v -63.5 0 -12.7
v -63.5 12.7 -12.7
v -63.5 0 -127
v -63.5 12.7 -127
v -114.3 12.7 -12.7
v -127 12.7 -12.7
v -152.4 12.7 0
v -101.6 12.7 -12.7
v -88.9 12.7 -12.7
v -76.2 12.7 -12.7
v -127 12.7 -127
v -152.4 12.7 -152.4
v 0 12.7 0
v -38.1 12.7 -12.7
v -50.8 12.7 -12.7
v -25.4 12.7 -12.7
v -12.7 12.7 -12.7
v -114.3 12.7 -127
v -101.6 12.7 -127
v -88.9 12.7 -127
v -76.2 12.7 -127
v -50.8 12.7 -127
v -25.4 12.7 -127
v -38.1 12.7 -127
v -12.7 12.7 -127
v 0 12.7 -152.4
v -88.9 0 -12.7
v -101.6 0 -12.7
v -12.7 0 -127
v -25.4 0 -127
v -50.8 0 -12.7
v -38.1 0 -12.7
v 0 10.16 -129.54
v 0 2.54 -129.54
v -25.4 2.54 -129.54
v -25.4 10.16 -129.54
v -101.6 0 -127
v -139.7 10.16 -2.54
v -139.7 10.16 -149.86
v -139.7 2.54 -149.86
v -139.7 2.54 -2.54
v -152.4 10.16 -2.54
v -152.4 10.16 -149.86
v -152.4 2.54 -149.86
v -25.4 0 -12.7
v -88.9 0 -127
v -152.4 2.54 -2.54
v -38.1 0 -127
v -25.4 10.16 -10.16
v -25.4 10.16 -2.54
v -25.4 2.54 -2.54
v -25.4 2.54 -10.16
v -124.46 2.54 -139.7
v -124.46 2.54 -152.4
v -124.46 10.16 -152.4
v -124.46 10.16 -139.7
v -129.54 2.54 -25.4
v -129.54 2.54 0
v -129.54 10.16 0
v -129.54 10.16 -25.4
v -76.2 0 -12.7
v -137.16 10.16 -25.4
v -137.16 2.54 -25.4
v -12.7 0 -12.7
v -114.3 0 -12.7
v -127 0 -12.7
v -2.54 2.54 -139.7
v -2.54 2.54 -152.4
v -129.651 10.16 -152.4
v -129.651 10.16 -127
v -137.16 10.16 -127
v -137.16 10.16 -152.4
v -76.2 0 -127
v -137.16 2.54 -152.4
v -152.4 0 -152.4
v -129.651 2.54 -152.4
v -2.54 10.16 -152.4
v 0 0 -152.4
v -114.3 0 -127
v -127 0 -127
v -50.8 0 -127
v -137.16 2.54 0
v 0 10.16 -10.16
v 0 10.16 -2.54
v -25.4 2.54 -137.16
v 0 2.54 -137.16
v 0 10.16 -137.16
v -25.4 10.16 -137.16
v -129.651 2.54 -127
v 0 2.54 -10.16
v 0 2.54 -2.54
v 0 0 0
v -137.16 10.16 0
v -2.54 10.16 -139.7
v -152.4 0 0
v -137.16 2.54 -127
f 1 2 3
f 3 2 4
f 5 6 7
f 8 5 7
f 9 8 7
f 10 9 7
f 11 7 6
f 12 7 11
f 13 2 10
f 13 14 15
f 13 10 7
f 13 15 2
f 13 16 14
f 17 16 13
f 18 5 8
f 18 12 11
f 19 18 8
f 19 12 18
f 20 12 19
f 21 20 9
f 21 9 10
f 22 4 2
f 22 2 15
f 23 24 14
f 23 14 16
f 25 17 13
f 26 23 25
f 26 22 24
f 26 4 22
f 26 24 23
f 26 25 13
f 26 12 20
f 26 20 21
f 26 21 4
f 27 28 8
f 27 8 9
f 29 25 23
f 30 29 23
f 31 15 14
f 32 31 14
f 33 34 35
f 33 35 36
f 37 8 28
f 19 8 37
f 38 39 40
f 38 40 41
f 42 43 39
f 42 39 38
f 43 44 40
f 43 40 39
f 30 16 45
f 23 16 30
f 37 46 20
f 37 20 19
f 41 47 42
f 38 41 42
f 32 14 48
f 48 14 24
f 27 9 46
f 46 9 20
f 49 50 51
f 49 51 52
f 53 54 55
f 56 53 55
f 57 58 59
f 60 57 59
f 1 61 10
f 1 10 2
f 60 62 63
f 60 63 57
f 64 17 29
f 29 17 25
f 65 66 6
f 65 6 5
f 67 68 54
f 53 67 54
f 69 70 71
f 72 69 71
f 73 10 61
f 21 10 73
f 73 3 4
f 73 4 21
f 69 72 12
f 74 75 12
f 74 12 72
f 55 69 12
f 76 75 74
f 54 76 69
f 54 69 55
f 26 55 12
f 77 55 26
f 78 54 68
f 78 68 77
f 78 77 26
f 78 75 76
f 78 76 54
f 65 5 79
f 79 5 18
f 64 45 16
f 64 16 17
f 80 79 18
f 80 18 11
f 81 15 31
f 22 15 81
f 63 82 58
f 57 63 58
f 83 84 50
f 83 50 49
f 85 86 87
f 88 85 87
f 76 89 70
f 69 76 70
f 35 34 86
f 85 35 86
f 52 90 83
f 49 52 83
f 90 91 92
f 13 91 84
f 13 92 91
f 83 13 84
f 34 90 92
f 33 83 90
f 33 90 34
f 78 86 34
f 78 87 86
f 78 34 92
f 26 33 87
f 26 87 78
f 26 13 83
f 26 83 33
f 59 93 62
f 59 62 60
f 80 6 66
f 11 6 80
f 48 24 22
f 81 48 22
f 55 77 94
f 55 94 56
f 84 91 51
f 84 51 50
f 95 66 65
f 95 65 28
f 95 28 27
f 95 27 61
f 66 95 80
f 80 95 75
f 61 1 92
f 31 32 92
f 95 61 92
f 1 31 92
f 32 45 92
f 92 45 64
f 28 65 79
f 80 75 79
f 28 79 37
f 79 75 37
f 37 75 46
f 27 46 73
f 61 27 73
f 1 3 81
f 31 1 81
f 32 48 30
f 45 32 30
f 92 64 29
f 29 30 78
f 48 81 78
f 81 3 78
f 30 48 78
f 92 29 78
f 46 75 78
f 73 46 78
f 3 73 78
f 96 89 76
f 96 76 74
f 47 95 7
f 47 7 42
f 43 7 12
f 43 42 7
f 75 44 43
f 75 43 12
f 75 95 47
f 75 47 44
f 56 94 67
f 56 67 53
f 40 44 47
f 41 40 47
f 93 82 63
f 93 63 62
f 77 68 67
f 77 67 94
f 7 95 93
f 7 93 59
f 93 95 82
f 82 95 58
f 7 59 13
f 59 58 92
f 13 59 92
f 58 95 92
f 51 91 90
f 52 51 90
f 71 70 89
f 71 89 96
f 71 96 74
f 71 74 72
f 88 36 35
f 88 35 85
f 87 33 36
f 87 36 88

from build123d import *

# Parameters (mm, degrees)
SKETCH3_W           = 152.4
SKETCH3_H           = 152.4
BOSS_EXTRUDE1_DEPTH = 12.7
SKETCH5_W           = 147.32
SKETCH5_H           = 7.62
CUT_EXTRUDE1_DEPTH  = 12.7
SKETCH6_W           = 12.7
SKETCH6_H           = 127
CUT_EXTRUDE3_DEPTH  = 12.7
SKETCH8_W           = 7.62
SKETCH8_H           = 7.62
CUT_EXTRUDE4_DEPTH  = 25.4
SKETCH9_W           = 7.62
SKETCH9_H           = 7.62
CUT_EXTRUDE5_DEPTH  = 25.4
SKETCH10_W          = 7.508888552
SKETCH10_H          = 7.62
CUT_EXTRUDE6_DEPTH  = 25.4
SKETCH11_W          = 7.62
SKETCH11_H          = 7.62
BOSS_EXTRUDE2_DEPTH = 25.4
SKETCH12_W          = 127.135461675
SKETCH12_H          = 12.7
BOSS_EXTRUDE3_DEPTH = 25.4
SKETCH14_W          = 121.92
SKETCH14_H          = 7.62
CUT_EXTRUDE7_DEPTH  = 12.7
SKETCH15_W          = 7.62
SKETCH15_H          = 7.62
CUT_EXTRUDE9_DEPTH  = 25.4


with BuildPart() as part:
    # Sketch3 → Boss-Extrude1 (new body)
    with BuildSketch(Plane(origin=(0, 0, 0), x_dir=(1, 0, 0), z_dir=(0, 1, 0))):
        with Locations((-76.2, 76.2)):
            Rectangle(SKETCH3_W, SKETCH3_H)
    extrude(amount=BOSS_EXTRUDE1_DEPTH)

    # Sketch5 → Cut-Extrude1 (cut)
    with BuildSketch(Plane.ZY.offset(152.4)):
        with Locations((-76.2, 6.35)):
            Rectangle(SKETCH5_W, SKETCH5_H)
    extrude(amount=-CUT_EXTRUDE1_DEPTH, mode=Mode.SUBTRACT)

    # Sketch6 → Cut-Extrude3 (cut)
    with BuildSketch(Plane(origin=(0, 12.7, 0), x_dir=(1, 0, 0), z_dir=(0, 1, 0))):
        with Locations((-120.65, 76.2)):
            Rectangle(SKETCH6_W, SKETCH6_H)
        with Locations((-95.25, 76.2)):
            Rectangle(SKETCH6_W, SKETCH6_H)
        with Locations((-69.85, 76.2)):
            Rectangle(SKETCH6_W, SKETCH6_H)
        with Locations((-44.45, 76.2)):
            Rectangle(SKETCH6_W, SKETCH6_H)
        with Locations((-19.05, 76.2)):
            Rectangle(SKETCH6_W, SKETCH6_H)
    extrude(amount=-CUT_EXTRUDE3_DEPTH, mode=Mode.SUBTRACT)

    # Sketch8 → Cut-Extrude4 (cut)
    with BuildSketch(Plane(origin=(0, 0, 0), x_dir=(0, 0, -1), z_dir=(1, 0, 0))):
        with Locations((146.05, 6.35)):
            Rectangle(SKETCH8_W, SKETCH8_H)
        with Locations((6.35, 6.35)):
            Rectangle(SKETCH8_W, SKETCH8_H)
    extrude(amount=-CUT_EXTRUDE4_DEPTH, mode=Mode.SUBTRACT)

    # Sketch9 → Cut-Extrude5 (cut)
    with BuildSketch(Plane.XY):
        with Locations((-133.35, 6.35)):
            Rectangle(SKETCH9_W, SKETCH9_H)
    extrude(amount=-CUT_EXTRUDE5_DEPTH, mode=Mode.SUBTRACT)

    # Sketch10 → Cut-Extrude6 (cut)
    with BuildSketch(Plane(origin=(0, 0, -152.4), x_dir=(-1, 0, 0), z_dir=(0, 0, -1))):
        with Locations((133.405555724, 6.35)):
            Rectangle(SKETCH10_W, SKETCH10_H)
    extrude(amount=-CUT_EXTRUDE6_DEPTH, mode=Mode.SUBTRACT)

    # Sketch11 → Boss-Extrude2 (add)
    with BuildSketch(Plane(origin=(-25.4, 0, 0), x_dir=(0, 0, -1), z_dir=(1, 0, 0))):
        with Locations((146.05, 6.35)):
            Rectangle(SKETCH11_W, SKETCH11_H)
    extrude(amount=BOSS_EXTRUDE2_DEPTH)

    # Sketch12 → Boss-Extrude3 (add)
    with BuildSketch(Plane(origin=(0, 0, -152.4), x_dir=(-1, 0, 0), z_dir=(0, 0, -1))):
        with Locations((63.567730838, 6.35)):
            Rectangle(SKETCH12_W, SKETCH12_H)
    extrude(amount=-BOSS_EXTRUDE3_DEPTH)

    # Sketch14 → Cut-Extrude7 (cut)
    with BuildSketch(Plane(origin=(0, 0, -152.4), x_dir=(-1, 0, 0), z_dir=(0, 0, -1))):
        with Locations((63.5, 6.35)):
            Rectangle(SKETCH14_W, SKETCH14_H)
    extrude(amount=-CUT_EXTRUDE7_DEPTH, mode=Mode.SUBTRACT)

    # Sketch15 → Cut-Extrude9 (cut)
    with BuildSketch(Plane(origin=(0, 0, 0), x_dir=(0, 0, -1), z_dir=(1, 0, 0))):
        with Locations((133.35, 6.35)):
            Rectangle(SKETCH15_W, SKETCH15_H)
    extrude(amount=-CUT_EXTRUDE9_DEPTH, mode=Mode.SUBTRACT)


solid = part.part
